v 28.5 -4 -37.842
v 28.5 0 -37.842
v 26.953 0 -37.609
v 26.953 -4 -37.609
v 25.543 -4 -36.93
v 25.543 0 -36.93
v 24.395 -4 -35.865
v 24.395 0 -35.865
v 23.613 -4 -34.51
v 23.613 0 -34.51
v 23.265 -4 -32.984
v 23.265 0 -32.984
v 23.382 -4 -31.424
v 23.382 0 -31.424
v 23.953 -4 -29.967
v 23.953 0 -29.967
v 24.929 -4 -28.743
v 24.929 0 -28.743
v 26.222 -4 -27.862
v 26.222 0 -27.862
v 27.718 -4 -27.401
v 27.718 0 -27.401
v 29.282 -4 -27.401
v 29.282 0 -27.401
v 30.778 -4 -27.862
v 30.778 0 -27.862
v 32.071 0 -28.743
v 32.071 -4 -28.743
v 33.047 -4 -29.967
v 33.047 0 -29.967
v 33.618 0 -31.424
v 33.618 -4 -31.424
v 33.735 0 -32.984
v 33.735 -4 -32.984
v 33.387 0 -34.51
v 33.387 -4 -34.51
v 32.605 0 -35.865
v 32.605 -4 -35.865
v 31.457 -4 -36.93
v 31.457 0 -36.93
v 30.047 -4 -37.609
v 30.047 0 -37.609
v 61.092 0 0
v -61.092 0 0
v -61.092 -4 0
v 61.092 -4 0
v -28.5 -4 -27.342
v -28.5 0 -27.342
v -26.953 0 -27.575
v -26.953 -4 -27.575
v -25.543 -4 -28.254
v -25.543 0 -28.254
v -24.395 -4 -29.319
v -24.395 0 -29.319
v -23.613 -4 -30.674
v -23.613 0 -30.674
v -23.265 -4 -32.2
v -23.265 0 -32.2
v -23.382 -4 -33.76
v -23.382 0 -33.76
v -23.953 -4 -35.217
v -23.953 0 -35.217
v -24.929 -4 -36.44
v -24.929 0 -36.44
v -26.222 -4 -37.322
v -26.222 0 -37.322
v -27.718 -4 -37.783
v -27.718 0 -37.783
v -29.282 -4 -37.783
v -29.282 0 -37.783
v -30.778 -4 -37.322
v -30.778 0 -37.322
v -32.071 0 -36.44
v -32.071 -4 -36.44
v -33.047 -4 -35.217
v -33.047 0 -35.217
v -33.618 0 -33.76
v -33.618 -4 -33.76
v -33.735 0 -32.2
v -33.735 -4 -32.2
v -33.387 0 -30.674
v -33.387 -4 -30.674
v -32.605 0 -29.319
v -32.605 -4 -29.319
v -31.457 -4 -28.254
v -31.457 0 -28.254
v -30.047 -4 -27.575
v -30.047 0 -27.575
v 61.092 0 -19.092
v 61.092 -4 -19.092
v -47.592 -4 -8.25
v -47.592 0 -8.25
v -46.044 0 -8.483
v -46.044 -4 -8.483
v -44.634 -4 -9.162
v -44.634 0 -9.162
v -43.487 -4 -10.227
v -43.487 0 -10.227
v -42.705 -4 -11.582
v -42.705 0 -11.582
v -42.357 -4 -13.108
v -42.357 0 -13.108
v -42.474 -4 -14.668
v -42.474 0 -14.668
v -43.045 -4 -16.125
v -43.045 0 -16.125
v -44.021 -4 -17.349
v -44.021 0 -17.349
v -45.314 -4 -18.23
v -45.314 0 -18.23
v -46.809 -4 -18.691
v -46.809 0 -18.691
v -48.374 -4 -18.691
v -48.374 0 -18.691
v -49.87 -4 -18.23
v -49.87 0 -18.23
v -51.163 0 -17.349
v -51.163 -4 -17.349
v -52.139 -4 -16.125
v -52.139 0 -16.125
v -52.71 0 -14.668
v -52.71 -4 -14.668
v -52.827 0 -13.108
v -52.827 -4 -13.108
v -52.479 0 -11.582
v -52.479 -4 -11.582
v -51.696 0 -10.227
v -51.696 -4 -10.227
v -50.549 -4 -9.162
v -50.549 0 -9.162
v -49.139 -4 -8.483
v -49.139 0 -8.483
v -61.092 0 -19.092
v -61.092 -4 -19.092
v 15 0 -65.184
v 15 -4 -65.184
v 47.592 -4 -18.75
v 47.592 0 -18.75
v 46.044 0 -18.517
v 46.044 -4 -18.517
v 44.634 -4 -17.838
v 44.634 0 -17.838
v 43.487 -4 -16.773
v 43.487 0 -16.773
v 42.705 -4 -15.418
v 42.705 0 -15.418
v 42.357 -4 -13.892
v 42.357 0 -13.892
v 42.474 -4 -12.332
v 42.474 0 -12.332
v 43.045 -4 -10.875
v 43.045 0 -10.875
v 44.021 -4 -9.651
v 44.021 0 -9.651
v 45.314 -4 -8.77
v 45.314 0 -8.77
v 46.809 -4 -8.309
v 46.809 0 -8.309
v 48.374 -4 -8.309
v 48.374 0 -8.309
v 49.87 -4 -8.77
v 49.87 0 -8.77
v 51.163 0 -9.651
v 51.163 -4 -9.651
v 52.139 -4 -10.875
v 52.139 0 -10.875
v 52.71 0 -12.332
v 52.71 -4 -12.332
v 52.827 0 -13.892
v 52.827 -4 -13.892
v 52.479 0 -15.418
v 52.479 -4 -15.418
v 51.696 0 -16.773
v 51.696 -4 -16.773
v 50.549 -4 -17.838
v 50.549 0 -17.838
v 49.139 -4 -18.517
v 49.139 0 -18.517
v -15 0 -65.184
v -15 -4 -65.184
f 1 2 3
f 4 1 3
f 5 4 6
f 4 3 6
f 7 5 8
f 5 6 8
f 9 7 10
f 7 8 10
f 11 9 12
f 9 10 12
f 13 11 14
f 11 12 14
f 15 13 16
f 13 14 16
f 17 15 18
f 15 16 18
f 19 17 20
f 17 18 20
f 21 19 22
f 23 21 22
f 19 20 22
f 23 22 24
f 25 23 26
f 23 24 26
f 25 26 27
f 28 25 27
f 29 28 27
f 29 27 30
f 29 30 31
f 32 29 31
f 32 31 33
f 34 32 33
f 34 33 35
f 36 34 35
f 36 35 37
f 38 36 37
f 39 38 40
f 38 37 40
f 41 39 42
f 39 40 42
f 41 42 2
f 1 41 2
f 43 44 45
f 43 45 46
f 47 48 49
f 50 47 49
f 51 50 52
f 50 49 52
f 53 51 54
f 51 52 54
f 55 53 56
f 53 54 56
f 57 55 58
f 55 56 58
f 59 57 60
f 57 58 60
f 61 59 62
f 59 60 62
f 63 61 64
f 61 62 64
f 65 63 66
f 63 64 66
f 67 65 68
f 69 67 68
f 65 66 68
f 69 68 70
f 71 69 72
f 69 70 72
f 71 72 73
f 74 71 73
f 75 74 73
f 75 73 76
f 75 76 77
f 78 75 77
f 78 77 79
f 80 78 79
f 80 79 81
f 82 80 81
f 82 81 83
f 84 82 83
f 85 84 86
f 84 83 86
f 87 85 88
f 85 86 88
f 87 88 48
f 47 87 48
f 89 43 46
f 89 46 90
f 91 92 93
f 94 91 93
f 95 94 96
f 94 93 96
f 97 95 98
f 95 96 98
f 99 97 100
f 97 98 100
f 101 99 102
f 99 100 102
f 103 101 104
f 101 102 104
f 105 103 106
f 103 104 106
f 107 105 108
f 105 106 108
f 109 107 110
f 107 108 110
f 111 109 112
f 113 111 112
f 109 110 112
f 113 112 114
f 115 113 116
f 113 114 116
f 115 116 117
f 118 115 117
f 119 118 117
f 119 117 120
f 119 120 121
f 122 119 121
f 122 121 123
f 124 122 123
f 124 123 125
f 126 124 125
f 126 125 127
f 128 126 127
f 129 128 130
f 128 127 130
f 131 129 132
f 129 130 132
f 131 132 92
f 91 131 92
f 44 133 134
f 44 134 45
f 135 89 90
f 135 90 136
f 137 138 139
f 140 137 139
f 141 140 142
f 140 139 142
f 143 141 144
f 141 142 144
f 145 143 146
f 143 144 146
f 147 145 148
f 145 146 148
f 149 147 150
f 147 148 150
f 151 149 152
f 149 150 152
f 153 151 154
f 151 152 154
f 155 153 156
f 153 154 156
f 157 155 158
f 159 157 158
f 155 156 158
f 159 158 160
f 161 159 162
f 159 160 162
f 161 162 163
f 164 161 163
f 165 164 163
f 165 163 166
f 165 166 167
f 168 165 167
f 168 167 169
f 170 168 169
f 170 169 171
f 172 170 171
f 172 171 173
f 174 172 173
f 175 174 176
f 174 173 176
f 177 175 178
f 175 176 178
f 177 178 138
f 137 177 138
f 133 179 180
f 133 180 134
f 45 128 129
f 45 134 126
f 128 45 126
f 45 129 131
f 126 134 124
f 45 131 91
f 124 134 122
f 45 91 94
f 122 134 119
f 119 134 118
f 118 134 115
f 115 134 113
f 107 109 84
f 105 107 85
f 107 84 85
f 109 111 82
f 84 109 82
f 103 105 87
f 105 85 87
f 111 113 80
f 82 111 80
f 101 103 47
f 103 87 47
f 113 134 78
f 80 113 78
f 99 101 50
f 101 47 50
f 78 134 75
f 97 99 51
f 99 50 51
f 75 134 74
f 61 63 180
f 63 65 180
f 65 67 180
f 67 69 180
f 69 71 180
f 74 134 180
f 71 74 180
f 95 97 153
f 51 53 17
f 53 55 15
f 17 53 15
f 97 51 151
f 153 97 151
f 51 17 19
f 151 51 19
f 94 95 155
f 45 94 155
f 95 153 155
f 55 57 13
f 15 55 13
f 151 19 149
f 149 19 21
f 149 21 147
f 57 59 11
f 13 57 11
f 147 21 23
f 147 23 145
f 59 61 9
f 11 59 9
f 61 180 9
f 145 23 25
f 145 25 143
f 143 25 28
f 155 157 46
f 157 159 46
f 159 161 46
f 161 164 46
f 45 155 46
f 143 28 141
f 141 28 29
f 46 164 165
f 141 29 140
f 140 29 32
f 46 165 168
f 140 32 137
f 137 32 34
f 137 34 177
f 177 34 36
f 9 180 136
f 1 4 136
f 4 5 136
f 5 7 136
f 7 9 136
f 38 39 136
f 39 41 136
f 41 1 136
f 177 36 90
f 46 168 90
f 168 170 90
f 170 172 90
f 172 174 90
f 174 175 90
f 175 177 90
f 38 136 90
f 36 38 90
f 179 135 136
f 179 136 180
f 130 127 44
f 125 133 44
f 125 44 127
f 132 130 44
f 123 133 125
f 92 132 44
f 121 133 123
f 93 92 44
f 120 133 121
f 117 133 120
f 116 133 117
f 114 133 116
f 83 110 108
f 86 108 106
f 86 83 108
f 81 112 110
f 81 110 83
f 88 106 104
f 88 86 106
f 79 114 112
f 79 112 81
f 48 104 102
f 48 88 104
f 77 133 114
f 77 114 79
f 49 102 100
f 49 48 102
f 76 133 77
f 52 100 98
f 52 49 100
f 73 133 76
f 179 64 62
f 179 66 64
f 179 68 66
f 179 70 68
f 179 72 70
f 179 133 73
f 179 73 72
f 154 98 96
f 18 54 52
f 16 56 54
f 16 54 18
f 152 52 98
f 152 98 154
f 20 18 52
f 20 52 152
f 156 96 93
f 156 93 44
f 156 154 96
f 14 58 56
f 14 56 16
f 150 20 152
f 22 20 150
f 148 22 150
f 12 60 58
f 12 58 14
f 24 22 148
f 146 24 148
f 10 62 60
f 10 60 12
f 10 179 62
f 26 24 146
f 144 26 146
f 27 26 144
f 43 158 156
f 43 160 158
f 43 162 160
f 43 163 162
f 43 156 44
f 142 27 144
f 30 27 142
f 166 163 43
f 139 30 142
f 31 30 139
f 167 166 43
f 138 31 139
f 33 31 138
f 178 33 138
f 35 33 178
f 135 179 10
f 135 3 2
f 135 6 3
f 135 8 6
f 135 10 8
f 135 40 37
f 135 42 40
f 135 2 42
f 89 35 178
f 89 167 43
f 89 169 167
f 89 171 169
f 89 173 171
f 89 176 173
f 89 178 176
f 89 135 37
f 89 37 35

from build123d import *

# Parameters (mm, degrees)
SKETCH_1_R             = 5.25
SM_BASE_FLANGE_1_DEPTH = 4


# Sheet-metal steps are written as plain solids
with BuildPart() as part:
    # Sketch 1 → Базовая кромка1 (new body)
    with BuildSketch(Plane(origin=(0, 0, 0), x_dir=(1, 0, 0), z_dir=(0, 1, 0))):
        Polygon((-61.091883092, 0), (61.091883092, 0), (61.091883092, 19.091883092), (15, 65.183766184), (-15, 65.183766184), (-61.091883092, 19.091883092), align=None)
        with Locations(Location((-28.5, 32.591883092, 0), (0, 0, 270))):
            Circle(SKETCH_1_R, mode=Mode.SUBTRACT)
        with Locations(Location((-47.591883092, 13.5, 0), (0, 0, 270))):
            Circle(SKETCH_1_R, mode=Mode.SUBTRACT)
        with Locations(Location((47.591883092, 13.5, 0), (0, 0, 90))):
            Circle(SKETCH_1_R, mode=Mode.SUBTRACT)
        with Locations(Location((28.5, 32.591883092, 0), (0, 0, 90))):
            Circle(SKETCH_1_R, mode=Mode.SUBTRACT)
    extrude(amount=-SM_BASE_FLANGE_1_DEPTH)


solid = part.part
